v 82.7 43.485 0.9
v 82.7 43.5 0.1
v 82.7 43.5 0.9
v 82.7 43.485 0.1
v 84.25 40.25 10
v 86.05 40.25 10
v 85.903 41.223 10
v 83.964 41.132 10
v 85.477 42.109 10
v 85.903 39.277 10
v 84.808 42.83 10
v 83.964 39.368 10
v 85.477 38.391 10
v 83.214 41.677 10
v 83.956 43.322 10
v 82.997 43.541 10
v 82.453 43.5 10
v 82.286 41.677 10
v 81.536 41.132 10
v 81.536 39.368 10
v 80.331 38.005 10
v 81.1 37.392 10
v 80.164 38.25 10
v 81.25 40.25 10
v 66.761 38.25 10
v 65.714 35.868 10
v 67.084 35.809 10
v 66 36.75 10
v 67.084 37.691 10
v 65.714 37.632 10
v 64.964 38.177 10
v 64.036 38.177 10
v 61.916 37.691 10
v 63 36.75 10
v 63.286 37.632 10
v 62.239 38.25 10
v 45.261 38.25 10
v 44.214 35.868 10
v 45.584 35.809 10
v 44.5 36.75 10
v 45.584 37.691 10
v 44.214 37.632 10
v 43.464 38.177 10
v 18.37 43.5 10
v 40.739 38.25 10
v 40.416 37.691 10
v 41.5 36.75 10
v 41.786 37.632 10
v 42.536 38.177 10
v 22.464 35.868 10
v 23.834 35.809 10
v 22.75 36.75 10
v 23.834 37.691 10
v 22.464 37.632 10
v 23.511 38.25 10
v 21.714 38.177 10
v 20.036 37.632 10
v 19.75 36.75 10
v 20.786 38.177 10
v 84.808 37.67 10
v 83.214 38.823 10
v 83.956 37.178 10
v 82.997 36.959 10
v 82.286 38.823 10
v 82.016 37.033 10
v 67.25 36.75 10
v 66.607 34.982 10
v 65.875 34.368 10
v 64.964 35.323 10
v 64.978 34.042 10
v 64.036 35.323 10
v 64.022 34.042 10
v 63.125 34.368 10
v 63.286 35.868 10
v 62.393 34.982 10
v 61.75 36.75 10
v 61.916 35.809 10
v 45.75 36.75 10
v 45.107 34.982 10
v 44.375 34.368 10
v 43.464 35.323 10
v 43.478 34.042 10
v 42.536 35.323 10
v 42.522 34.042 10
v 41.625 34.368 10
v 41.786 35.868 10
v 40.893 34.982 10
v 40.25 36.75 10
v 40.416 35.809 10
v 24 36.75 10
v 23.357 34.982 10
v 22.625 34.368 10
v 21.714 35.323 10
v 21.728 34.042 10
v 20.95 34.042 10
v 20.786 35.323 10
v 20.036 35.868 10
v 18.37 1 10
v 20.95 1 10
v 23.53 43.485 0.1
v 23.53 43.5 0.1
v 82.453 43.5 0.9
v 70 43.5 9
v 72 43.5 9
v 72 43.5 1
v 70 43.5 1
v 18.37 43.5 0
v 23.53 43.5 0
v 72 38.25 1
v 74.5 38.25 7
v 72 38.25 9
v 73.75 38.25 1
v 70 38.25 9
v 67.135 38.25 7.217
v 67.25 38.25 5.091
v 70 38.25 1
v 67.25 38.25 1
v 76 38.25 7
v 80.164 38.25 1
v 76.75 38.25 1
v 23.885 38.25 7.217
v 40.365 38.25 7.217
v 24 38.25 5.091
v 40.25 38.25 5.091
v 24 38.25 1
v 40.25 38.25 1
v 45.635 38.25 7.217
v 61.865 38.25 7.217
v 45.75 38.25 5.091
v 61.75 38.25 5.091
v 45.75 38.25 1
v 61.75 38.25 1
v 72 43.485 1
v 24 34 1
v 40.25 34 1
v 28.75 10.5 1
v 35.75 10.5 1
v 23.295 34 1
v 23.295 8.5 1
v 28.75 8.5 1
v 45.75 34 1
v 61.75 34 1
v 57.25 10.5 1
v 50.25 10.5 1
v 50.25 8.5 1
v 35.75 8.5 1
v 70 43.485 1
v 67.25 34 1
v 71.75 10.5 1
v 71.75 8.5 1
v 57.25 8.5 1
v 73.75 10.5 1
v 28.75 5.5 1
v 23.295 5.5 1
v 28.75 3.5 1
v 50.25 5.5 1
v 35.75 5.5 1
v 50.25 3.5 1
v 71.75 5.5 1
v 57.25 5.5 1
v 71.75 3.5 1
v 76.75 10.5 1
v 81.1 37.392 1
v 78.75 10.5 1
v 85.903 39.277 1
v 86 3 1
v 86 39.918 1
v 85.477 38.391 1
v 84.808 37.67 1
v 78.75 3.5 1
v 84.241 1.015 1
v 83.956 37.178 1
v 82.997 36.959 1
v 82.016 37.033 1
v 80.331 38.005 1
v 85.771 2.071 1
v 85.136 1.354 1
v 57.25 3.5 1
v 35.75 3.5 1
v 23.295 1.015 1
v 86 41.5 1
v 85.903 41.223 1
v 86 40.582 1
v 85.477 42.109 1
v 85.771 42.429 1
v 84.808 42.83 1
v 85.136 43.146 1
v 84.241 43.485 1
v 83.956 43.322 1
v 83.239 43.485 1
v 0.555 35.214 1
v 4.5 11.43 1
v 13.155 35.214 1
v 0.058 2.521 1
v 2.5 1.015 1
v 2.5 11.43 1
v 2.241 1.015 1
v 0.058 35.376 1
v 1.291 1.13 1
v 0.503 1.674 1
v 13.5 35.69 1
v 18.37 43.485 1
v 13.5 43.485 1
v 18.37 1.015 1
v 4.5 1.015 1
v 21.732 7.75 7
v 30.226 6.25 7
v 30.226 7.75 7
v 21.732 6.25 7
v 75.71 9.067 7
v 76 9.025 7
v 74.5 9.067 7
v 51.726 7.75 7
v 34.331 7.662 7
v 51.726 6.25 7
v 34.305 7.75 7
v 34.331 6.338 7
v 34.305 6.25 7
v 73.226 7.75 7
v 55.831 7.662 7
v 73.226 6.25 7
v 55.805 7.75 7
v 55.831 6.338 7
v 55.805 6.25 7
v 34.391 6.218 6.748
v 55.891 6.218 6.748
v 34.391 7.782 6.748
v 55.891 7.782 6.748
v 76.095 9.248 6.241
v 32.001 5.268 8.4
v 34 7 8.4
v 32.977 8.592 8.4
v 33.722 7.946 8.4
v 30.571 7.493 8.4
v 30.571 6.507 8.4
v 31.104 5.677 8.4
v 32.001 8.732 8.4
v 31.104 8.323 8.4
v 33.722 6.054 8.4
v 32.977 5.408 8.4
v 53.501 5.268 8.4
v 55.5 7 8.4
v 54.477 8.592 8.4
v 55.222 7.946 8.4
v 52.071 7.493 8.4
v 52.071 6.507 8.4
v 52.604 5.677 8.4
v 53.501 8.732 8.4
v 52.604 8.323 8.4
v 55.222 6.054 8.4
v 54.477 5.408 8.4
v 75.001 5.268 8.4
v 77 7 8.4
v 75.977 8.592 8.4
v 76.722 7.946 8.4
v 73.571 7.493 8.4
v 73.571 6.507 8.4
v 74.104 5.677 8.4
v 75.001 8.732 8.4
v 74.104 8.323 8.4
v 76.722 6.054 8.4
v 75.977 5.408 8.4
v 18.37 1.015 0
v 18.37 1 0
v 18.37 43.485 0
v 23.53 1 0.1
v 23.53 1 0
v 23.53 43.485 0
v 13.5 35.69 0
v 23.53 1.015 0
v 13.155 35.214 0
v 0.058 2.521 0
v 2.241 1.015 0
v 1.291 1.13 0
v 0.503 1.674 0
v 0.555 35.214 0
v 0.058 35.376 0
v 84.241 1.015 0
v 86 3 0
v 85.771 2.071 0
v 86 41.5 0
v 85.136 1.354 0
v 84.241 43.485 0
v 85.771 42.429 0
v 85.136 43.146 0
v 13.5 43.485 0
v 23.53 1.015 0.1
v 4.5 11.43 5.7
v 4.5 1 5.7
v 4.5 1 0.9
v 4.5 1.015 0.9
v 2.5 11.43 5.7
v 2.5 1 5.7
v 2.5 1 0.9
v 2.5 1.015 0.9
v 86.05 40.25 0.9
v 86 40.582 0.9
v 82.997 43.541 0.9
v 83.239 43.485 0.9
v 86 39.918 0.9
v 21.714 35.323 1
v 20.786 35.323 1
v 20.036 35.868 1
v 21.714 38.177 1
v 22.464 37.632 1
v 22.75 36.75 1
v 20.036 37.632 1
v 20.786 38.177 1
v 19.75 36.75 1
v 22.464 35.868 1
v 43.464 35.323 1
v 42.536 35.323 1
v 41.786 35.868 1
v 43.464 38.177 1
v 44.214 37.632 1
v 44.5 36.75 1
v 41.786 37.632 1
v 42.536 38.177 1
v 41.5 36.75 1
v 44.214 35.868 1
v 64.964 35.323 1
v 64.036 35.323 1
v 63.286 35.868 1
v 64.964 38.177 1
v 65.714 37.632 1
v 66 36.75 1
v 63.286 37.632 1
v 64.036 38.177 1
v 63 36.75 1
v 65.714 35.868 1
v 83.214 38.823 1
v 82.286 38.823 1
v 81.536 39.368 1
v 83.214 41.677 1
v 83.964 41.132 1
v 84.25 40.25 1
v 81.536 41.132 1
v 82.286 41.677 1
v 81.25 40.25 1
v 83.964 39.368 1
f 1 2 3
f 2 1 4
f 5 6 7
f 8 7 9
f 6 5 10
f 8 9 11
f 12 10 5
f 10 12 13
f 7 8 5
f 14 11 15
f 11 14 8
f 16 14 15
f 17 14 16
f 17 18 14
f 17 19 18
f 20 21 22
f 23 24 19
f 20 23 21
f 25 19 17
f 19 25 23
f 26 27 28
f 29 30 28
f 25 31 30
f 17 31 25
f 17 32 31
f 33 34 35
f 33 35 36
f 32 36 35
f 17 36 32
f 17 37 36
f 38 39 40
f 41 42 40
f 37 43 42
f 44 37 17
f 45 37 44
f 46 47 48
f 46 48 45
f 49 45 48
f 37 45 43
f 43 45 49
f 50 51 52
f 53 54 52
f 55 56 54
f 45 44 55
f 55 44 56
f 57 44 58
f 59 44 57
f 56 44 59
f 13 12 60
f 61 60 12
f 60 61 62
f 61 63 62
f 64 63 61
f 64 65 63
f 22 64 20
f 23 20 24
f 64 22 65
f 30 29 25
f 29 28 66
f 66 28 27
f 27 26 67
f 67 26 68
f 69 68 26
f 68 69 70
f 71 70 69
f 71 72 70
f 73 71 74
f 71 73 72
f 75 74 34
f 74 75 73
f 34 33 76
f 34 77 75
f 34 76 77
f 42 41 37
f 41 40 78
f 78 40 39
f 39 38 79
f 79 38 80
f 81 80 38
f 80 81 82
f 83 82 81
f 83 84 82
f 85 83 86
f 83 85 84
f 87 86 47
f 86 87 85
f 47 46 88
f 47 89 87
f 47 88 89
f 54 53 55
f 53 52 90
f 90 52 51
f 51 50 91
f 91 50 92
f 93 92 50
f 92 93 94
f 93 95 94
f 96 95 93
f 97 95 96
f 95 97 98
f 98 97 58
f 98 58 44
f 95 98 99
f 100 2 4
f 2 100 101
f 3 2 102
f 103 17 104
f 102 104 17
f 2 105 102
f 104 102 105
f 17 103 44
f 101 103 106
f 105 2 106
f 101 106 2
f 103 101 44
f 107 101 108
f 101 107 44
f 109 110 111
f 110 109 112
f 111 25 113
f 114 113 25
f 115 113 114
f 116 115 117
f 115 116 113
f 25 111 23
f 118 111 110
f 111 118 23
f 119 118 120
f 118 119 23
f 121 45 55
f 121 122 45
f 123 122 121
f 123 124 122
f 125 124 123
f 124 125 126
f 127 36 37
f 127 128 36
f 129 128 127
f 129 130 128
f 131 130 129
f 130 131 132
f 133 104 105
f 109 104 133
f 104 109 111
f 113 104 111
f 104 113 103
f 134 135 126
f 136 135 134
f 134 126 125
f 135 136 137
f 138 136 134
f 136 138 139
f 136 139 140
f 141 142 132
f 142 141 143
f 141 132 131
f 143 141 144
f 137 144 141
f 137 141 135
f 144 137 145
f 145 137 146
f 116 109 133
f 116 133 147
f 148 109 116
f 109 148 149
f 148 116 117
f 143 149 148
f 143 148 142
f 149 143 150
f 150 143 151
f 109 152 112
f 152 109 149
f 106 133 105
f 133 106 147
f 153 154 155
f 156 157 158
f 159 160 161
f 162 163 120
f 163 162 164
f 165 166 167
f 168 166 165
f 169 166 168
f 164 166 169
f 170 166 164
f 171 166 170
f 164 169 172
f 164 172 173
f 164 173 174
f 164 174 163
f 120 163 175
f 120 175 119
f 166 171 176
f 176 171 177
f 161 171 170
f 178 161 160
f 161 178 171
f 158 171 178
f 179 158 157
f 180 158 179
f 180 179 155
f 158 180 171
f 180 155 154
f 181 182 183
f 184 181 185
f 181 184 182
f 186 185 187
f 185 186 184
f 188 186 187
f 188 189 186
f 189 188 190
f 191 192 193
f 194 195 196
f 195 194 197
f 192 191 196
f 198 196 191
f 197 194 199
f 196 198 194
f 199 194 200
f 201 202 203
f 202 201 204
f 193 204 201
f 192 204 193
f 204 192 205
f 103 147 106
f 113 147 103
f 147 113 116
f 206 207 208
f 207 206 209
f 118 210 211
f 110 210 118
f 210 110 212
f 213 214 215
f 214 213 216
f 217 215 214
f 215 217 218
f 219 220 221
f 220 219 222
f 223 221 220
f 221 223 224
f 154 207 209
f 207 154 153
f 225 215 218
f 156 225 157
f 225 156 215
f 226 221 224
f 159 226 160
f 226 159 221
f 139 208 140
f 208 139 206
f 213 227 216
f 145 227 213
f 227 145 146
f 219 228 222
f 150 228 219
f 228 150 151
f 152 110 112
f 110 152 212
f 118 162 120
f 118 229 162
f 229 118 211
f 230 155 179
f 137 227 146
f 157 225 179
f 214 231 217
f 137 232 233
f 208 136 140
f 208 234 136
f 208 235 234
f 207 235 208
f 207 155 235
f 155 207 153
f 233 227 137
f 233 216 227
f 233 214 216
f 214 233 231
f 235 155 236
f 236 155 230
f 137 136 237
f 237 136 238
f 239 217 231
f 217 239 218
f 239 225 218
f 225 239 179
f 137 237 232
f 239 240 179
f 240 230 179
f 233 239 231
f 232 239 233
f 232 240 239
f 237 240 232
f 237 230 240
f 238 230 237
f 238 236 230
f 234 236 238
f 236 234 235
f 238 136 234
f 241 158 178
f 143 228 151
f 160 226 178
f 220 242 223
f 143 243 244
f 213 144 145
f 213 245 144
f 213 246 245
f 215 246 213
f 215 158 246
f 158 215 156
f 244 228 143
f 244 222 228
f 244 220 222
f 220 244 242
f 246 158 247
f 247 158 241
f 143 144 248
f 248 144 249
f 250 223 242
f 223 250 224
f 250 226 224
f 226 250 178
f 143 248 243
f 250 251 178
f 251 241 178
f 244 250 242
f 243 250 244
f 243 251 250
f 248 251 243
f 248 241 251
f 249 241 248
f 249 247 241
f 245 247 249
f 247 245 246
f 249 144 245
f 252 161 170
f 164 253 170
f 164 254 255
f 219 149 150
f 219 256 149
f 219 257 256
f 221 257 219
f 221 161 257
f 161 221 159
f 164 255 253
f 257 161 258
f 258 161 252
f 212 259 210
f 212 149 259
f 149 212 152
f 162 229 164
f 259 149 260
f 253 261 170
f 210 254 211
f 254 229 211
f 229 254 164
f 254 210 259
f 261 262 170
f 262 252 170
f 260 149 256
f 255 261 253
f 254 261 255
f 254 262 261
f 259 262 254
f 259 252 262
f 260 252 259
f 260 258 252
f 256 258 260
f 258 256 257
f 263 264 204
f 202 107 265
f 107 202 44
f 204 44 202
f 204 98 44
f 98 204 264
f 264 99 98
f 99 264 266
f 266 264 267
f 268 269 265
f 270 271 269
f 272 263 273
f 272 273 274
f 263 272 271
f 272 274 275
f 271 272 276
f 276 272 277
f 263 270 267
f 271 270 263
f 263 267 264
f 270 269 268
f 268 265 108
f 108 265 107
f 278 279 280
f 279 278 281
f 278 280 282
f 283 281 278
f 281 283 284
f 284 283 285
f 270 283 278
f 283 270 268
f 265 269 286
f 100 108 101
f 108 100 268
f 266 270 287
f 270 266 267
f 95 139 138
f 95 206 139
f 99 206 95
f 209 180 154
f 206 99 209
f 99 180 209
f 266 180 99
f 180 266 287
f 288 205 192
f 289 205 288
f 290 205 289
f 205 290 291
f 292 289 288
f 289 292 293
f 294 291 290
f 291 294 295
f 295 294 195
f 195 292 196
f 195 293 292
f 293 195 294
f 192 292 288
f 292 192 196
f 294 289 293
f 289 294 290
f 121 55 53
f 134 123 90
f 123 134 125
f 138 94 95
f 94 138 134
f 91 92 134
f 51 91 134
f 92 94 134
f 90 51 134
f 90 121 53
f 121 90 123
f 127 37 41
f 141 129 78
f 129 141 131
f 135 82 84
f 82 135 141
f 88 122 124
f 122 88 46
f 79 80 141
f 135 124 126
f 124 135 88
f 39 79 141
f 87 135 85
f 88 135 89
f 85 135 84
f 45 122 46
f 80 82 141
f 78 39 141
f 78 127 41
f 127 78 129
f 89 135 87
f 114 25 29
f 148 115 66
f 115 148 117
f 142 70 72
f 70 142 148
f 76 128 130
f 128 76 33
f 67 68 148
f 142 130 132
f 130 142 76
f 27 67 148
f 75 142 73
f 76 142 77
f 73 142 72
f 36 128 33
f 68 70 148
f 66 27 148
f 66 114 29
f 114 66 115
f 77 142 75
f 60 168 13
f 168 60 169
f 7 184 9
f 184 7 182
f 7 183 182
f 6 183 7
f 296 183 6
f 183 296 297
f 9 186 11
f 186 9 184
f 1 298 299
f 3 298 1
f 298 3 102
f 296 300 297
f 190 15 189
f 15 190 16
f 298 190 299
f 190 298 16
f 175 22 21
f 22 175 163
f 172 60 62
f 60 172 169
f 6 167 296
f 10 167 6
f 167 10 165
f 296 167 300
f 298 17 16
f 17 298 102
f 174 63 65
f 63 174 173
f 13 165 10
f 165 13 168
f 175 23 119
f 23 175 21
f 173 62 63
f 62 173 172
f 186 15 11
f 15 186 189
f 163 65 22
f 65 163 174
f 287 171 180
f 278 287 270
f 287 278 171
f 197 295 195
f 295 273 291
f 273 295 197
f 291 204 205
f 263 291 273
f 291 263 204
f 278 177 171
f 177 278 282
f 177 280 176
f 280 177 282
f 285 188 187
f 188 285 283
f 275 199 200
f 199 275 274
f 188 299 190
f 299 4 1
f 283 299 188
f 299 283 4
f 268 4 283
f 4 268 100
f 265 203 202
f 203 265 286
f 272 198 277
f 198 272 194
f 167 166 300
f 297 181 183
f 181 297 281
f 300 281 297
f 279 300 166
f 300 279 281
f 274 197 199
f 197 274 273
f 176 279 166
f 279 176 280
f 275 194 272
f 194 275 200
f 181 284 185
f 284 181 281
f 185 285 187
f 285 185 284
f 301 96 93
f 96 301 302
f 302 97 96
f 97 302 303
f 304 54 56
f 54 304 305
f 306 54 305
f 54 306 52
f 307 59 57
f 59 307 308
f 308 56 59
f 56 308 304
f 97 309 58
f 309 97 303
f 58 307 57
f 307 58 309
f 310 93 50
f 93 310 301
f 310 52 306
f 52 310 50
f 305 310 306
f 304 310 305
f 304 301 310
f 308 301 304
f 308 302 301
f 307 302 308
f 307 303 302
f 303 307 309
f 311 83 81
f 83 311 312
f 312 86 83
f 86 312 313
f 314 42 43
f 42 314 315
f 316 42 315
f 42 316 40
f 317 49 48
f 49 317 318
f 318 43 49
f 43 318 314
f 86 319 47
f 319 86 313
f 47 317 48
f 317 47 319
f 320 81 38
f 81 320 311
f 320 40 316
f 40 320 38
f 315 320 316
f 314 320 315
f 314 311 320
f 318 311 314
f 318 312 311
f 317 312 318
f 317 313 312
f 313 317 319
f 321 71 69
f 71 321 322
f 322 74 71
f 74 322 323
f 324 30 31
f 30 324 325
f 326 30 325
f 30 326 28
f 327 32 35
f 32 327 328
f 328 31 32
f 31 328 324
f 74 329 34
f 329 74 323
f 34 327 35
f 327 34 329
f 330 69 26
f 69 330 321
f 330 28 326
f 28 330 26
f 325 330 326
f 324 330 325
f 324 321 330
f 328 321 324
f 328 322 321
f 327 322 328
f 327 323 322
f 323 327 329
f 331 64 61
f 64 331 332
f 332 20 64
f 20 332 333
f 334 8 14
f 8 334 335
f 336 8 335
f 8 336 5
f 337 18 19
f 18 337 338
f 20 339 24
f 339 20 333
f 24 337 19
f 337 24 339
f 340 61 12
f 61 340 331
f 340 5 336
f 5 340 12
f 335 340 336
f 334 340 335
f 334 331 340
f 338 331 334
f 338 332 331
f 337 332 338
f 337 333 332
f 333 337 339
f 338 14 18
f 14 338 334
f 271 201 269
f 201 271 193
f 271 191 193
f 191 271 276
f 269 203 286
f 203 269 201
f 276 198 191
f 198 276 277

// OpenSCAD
hq = true;
clr = 0.2;

$fs = hq ? 1 : 4;
$fa = hq ? 1 : 4;
eps = 0.1;

// Constants from the Eagle file

// Board dimensions
board_x = 0;
board_y = 0;
board_w = 86;
board_h = 43.5;
board_r = 2;
board_ne_r = 3.3;
board_min_y = 1;                // screwup: make board 1mm shorter.

// Teensy location
teensy_cx =  9.08;
teensy_cy = 19.05;
teensy_w =  7 * 2.54;
teensy_h = 14 * 2.54;
teensy_paddle_w = 20.75;

// Tactile switches
sw1_x = 32.25;
sw1_y = 7;
sw2_x = 53.75;
sw2_y = 7;
sw3_x = 75.25;
sw3_y = 7;
swlast_x = sw3_x;
sw_d = 2.5;

// Screw holes
hole1_x = 21.25;
hole1_y = 36.75;

hole2_x = 43;
hole2_y = 36.75;

hole3_x = 64.5;
hole3_y = 36.75;

hole4_x = 82.75;
hole4_y = 40.25;

hole_d = 3;
hole_clr = 0;

// Paddles
paddle_y = 3.5;

// Spine
spine_y = 38.25;
spine_cx2 = (37.25 + 48.5) / 2;
spine_cx3 = (58.75 + 66.72) / 2;

// Header
header_cx = 7.79;
header_cy = 39.73;
header_w = 3 * 2.54;
header_h = 2 * 2.54;

// End Eagle constants

teensy_rx = teensy_cx + teensy_w / 2 + clr; // Teensy right side x coord.

// Z heights
base_z = 1;
deck_z = base_z + 9;
sw_z = deck_z - 1.6;
teensy_z = deck_z - 4.1;
bulkhead_z = deck_z - 3;

module centered_cube(size, zt=0) {
    translate([-size[0] / 2, -size[1] / 2, zt])
        cube(size);
}

module round_rect(size, r) {
    hull()
        for (x = [r, size[0] - r]) for ( y = [r, size[1] - r]) {
            translate([x, y, 0])
                cylinder(r=r, h=size[2]);
        }
}


module base() {
    translate([0, board_min_y, 0])
        round_rect([board_w, board_h - board_min_y, base_z], board_r);
}

module spine() {
    lx = teensy_rx + clr;
    difference() {
        translate([lx + eps, spine_y, eps])
            cube([board_w - lx - board_ne_r - eps,
                  board_h - spine_y,
                  deck_z - eps]);
        // strain relief
        translate([board_w - 16, spine_y - eps, base_z])
            cube([2, board_h, deck_z - base_z - 1]);
    }
}

module bulkheads() {
    bt0 = 3;
    bt1 = 1.5;
    bx = teensy_rx + clr;
    by = sw1_y;
    bw = swlast_x - bx;
    bh = board_h - by;
    translate([bx + eps, by, 0])
        hull() {
            translate([0, -bt0/2, base_z - eps])
                cube([bw + bt0/2, bt0, eps]);
            translate([0, -bt1/2, bulkhead_z - eps])
                cube([bw + bt1/2, bt1, eps]);
        }
    translate([bx + bw, board_h, 0])
        rotate(-90)
            hull() {
                translate([eps, -bt0/2, base_z - eps])
                    cube([bh + bt0/2 - eps, bt0, eps]);
                translate([eps, -bt1/2, bulkhead_z - eps])
                    cube([bh + bt1/2 - eps, bt1, eps]);
            }
}

module screw_support(x, y, z) {
    support_d = hole_d + 2.5;
    hull() {
        translate([x, y, base_z - eps])
            centered_cube([support_d, support_d, eps]);
        translate([x, y, z - eps])
            cylinder(d=support_d, h = eps);
    }
}

module end_screw_support(x, y ,z) {
    support_r = board_ne_r;
    translate([x, y, base_z - eps])
        cylinder(r = support_r, h = z - base_z + eps);
}

module screw_supports() {
    screw_support(hole1_x, hole1_y, deck_z);
    screw_support(hole2_x, hole2_y, deck_z);
    screw_support(hole3_x, hole3_y, deck_z);
    end_screw_support(hole4_x, hole4_y, deck_z);
}

module screw_hole(x, y, z) {
    translate([x, y, z])
        cylinder(d=hole_d + hole_clr, h=deck_z + 3);
}

module screw_holes() {
    screw_hole(hole1_x, hole1_y, base_z);
    screw_hole(hole2_x, hole2_y, base_z);
    screw_hole(hole3_x, hole3_y, base_z);
    screw_hole(hole4_x, hole4_y, base_z);
}

module switch_pillars() {
    module switch_pillar(x, y) {
        mbh = 2 * (y - paddle_y);
        mbw = mbh;
        translate([x, y, 0])
            hull() {
                centered_cube([mbw, mbh, eps], zt=base_z - eps);
                translate([0, 0, sw_z - eps])
                    cylinder(d=sw_d + 1, h=eps);
            }
    }
    switch_pillar(sw1_x, sw1_y);
    switch_pillar(sw2_x, sw2_y);
    switch_pillar(sw3_x, sw3_y);
}

module under_teensy() {
    uw = teensy_paddle_w - teensy_rx;
    translate([teensy_rx + clr, board_min_y, 0])
        hull() {
            cube([2 * uw, board_h - board_min_y, eps]);
            translate([0, 0, deck_z - eps])
                cube([uw, board_h - board_min_y, eps]);
        }
    translate([2.5, board_min_y, base_z - eps])
        cube([2, 4.5 * 2.54 - board_min_y, teensy_z - base_z - eps]);
}

module header_cutout() {
    hdr_clr = 2;
    translate([-eps, header_cy - header_h / 2 - hdr_clr, -eps])
        round_rect([header_cx + header_w / 2 + hdr_clr,
                    board_h,
                    deck_z + 2 * eps],
                   r=0.5);
}

module substrate() {
    difference() {
        union() {
            base();
            spine();
            bulkheads();
            switch_pillars();
            under_teensy();
            screw_supports();
        };
        screw_holes();
        header_cutout();
    };
}

substrate();
